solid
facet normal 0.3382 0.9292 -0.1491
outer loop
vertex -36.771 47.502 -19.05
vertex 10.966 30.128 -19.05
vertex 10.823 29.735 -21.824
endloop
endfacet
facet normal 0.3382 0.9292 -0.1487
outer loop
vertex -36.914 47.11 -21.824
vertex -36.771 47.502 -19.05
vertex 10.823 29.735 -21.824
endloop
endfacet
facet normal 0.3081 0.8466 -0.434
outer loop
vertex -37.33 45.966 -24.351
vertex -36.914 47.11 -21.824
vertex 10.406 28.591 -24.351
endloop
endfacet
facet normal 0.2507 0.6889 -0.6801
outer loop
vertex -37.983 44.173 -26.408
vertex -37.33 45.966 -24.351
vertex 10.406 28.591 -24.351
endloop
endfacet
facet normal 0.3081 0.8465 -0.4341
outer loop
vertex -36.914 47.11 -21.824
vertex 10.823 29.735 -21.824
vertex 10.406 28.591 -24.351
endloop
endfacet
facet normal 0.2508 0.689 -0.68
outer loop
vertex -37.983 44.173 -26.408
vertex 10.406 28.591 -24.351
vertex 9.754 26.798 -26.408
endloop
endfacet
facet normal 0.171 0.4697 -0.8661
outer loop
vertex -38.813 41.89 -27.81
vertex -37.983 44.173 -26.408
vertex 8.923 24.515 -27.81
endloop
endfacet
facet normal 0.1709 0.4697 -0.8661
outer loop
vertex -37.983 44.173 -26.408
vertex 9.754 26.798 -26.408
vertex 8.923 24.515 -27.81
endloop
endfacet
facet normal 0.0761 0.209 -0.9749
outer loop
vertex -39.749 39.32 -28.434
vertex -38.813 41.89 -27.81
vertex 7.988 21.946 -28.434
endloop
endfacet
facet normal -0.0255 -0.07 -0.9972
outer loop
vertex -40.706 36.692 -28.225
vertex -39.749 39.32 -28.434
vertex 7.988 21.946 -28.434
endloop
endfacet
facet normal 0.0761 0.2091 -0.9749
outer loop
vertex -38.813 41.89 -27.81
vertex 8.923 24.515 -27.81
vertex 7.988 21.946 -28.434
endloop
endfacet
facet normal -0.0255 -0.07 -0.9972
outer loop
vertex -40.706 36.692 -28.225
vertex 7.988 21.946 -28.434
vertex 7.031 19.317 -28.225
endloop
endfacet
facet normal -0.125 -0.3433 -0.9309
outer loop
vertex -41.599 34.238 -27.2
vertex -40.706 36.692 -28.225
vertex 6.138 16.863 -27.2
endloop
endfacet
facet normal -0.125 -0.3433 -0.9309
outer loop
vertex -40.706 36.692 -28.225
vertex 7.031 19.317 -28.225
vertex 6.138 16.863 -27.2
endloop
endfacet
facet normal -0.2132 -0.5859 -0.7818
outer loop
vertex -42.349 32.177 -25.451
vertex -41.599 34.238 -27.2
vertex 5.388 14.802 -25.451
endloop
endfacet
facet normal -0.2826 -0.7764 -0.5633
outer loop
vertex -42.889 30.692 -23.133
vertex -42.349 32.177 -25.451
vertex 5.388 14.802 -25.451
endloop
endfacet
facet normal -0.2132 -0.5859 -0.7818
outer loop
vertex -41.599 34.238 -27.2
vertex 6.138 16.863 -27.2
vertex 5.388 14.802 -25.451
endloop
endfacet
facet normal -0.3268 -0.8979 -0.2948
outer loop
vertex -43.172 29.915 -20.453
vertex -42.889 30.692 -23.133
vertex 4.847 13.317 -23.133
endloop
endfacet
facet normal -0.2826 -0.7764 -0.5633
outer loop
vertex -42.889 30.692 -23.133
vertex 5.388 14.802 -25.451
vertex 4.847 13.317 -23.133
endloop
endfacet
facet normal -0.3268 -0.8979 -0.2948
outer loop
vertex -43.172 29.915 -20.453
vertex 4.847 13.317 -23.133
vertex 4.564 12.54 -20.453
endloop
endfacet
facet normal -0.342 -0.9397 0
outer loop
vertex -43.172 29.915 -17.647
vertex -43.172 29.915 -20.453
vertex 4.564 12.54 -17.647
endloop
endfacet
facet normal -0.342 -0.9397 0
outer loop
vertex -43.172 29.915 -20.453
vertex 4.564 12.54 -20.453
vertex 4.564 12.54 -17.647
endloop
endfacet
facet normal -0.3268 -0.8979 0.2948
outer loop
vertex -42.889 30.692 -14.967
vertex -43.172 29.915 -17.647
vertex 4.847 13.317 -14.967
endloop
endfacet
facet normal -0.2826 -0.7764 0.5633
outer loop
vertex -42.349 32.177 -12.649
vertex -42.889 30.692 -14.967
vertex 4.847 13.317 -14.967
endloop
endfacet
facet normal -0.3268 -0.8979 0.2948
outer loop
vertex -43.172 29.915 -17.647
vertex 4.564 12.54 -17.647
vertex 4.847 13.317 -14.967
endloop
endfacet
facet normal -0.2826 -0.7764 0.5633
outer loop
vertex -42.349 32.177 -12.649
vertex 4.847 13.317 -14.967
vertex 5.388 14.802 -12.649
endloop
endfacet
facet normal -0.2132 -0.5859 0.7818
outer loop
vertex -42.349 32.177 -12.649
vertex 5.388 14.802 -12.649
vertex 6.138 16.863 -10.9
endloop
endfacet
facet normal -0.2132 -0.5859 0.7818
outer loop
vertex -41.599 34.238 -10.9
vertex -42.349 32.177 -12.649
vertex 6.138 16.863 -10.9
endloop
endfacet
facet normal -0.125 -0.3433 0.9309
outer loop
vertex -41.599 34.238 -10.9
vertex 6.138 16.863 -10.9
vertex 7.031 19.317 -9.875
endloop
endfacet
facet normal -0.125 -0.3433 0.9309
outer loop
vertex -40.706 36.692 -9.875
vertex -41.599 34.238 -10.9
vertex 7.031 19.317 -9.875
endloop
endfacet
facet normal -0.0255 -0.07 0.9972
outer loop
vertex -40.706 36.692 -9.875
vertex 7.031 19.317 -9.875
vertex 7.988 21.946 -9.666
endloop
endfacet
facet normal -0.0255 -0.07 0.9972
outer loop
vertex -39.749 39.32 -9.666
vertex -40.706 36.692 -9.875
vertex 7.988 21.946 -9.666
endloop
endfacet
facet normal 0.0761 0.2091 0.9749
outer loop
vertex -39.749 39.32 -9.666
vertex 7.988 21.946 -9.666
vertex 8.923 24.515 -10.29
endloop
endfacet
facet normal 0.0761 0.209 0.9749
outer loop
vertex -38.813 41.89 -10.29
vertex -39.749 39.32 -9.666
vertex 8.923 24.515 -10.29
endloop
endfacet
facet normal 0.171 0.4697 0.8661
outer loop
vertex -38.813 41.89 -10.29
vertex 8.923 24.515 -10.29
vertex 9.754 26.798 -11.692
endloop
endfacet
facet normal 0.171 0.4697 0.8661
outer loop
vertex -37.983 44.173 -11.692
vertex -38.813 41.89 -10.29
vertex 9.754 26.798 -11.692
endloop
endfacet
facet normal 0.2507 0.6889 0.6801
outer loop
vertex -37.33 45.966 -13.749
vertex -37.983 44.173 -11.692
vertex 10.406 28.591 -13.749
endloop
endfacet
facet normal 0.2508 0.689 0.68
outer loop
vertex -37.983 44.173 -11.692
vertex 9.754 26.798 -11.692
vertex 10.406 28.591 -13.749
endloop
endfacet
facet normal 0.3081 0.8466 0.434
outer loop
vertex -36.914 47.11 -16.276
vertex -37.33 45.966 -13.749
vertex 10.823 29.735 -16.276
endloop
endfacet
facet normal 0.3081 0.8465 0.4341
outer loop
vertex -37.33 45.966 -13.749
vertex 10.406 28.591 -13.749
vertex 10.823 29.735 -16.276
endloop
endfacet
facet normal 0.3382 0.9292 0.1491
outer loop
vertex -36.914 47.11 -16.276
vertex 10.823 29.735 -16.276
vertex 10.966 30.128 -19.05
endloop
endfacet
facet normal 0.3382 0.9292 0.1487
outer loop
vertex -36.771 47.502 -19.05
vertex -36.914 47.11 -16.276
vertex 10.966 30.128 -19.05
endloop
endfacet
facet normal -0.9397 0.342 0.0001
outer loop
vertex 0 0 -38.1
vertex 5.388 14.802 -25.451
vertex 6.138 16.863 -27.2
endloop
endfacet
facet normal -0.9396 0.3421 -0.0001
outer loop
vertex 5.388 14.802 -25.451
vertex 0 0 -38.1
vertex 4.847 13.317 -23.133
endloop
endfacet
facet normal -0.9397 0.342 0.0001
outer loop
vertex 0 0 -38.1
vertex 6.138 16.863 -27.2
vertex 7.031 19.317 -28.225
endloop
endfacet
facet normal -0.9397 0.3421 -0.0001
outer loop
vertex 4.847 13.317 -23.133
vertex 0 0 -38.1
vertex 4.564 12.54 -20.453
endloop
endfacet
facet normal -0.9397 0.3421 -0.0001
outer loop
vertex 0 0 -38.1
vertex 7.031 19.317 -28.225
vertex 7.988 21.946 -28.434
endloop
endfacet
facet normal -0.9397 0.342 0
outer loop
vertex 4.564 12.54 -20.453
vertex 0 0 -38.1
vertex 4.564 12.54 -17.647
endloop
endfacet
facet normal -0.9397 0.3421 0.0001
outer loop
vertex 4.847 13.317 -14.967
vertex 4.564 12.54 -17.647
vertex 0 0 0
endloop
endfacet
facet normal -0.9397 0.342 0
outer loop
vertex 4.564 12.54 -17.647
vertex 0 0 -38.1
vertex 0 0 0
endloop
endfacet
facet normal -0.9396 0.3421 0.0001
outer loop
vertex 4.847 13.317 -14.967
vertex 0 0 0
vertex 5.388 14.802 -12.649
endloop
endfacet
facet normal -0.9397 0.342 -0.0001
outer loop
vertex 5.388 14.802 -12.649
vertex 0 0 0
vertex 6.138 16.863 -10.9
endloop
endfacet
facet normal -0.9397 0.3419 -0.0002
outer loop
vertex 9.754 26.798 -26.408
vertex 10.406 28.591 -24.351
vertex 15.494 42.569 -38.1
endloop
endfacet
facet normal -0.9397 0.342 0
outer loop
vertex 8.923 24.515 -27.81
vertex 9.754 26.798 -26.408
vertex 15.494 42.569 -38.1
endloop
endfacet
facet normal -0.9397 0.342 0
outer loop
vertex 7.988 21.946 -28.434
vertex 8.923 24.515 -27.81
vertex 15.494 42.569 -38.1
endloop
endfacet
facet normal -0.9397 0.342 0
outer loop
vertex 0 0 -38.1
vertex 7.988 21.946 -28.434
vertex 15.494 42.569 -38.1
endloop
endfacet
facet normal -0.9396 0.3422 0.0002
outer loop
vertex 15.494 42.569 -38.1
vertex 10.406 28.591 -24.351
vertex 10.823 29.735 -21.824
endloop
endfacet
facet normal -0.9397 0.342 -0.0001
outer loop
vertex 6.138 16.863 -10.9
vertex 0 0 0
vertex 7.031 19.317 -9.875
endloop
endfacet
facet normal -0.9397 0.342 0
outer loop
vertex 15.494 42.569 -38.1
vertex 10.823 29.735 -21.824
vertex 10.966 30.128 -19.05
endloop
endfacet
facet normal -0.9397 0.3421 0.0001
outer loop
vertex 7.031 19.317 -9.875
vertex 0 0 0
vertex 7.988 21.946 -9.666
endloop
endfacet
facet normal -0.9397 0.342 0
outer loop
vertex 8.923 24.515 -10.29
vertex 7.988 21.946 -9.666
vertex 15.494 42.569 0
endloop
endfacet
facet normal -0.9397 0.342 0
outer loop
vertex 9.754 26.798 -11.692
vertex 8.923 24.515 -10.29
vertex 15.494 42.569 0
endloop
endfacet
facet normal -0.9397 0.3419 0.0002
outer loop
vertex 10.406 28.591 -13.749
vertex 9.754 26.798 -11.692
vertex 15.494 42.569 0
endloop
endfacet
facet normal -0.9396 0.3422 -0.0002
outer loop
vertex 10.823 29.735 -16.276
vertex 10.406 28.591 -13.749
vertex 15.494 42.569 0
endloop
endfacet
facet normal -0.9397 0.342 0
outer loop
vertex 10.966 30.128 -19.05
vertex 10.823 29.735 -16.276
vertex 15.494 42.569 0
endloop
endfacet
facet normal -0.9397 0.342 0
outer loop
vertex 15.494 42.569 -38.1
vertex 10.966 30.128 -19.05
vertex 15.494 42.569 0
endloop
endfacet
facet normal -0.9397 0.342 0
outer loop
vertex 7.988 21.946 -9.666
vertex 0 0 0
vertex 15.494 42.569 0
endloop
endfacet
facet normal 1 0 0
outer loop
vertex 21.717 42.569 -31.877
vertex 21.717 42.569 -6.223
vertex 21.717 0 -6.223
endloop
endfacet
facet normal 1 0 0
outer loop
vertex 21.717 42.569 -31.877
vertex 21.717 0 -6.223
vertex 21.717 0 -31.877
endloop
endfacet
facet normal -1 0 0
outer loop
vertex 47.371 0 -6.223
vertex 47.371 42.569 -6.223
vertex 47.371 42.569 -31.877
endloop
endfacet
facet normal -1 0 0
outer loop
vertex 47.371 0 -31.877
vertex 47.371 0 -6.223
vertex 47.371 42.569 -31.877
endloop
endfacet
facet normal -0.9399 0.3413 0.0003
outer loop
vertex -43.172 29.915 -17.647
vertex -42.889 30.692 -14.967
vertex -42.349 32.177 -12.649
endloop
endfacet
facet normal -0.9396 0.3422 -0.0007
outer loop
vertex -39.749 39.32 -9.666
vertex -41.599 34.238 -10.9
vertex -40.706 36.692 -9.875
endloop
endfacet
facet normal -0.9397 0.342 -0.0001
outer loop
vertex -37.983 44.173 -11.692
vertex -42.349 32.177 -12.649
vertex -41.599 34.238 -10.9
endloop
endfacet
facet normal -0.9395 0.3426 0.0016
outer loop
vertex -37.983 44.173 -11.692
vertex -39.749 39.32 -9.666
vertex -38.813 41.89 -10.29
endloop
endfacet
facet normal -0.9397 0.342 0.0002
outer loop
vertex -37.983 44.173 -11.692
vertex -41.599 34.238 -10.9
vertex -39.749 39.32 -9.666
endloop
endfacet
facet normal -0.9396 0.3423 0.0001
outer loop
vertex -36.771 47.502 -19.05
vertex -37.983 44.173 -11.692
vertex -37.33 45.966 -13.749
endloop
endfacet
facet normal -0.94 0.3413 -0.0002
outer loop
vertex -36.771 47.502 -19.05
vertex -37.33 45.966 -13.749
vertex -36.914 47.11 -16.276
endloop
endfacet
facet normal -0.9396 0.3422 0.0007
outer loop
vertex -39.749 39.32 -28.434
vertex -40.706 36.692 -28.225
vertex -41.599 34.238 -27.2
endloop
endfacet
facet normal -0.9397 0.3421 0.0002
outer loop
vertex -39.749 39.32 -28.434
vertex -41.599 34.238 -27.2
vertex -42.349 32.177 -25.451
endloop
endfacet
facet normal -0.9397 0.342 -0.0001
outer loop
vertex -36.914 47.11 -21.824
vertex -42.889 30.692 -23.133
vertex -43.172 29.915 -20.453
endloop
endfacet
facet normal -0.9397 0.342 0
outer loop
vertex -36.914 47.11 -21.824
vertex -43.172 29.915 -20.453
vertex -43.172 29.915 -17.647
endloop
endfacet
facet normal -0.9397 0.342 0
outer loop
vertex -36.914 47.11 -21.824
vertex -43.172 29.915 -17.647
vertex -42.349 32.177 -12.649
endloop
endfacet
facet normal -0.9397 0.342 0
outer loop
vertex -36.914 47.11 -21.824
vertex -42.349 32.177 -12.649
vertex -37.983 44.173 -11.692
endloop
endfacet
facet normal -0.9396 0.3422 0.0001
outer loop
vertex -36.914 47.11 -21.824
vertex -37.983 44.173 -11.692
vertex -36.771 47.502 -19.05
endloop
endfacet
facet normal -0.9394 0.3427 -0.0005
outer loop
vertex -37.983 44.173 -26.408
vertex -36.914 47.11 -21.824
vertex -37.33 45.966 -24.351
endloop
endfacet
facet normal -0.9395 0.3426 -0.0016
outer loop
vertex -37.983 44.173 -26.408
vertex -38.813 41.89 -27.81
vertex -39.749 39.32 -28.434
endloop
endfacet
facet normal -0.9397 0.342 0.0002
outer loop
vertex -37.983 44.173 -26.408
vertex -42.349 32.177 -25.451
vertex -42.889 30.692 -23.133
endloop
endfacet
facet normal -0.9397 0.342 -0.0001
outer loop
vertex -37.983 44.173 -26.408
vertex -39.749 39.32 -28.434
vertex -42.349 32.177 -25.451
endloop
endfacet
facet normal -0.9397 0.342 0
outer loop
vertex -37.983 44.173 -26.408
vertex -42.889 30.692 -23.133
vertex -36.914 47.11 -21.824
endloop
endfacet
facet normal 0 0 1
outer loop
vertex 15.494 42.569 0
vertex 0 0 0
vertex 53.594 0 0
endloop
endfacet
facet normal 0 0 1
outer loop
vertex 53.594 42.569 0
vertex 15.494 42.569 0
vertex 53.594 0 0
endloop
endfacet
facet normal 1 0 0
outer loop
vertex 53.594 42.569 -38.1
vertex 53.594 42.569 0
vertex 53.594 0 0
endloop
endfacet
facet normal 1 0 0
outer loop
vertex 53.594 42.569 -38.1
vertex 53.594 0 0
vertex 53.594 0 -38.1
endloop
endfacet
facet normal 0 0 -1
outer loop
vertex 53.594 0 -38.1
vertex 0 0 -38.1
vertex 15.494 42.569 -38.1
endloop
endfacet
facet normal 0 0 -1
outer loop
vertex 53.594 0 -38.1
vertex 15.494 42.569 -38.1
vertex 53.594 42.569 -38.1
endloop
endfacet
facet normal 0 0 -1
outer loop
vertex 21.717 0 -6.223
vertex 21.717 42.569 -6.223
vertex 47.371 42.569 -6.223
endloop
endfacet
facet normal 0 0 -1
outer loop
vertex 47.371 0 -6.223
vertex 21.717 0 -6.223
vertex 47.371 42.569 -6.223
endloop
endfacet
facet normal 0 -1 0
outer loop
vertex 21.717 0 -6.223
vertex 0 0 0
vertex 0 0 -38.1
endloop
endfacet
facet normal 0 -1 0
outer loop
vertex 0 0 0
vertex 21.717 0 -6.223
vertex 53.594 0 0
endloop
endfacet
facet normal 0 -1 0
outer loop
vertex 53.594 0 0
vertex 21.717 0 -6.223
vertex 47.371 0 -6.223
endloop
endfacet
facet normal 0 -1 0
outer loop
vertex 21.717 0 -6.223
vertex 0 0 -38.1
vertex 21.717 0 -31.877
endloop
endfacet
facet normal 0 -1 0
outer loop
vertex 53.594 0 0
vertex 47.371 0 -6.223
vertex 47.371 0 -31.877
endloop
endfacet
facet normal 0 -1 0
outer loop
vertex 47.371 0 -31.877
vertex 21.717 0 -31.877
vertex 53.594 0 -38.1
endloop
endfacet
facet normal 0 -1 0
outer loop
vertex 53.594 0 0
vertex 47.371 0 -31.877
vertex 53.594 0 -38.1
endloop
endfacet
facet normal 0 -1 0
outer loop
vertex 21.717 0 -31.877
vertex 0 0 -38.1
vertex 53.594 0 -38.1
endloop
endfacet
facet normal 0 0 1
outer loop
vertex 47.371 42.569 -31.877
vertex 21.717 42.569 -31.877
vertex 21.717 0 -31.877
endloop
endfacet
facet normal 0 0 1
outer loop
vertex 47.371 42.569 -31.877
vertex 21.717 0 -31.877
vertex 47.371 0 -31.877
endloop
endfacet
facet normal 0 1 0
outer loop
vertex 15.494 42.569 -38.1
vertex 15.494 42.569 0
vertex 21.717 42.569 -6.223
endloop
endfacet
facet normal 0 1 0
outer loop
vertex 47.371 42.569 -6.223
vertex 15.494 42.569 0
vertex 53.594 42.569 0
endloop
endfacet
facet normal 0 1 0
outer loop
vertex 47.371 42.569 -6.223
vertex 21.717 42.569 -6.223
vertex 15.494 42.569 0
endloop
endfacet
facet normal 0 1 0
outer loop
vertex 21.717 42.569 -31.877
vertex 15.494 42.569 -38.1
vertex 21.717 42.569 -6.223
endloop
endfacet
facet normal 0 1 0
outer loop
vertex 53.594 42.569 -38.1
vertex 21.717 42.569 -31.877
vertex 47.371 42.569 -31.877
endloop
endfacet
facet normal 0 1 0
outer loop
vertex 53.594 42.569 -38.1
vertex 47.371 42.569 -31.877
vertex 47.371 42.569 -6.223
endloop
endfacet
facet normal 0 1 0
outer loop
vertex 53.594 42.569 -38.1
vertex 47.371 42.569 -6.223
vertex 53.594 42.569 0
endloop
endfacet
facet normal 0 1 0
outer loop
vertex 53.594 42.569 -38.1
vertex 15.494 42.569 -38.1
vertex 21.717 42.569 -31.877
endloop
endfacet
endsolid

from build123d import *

# Parameters (mm, degrees)
SKETCH1_W           = 53.594
SKETCH1_H           = 38.1
BOSS_EXTRUDE1_DEPTH = 42.5694094
CUT_EXTRUDE1_DEPTH  = 79.333144024
SKETCH5_W           = 25.654
SKETCH5_H           = 25.654
CUT_EXTRUDE2_DEPTH  = 79.333144024
SKETCH6_R           = 9.4107
BOSS_EXTRUDE2_DEPTH = 50.8


with BuildPart() as part:
    # Sketch1 → Boss-Extrude1 (new body)
    with BuildSketch(Plane(origin=(0, 0, 0), x_dir=(1, 0, 0), z_dir=(0, 1, 0))):
        with Locations((26.797, 19.05)):
            Rectangle(SKETCH1_W, SKETCH1_H)
    extrude(amount=BOSS_EXTRUDE1_DEPTH)

    # Sketch4 → Cut-Extrude1 (cut, through all)
    with BuildSketch(Plane.XY):
        Polygon((0, -5.737e-06), (15.494, 42.5694094), (0, 42.5694094), align=None)
    extrude(amount=-CUT_EXTRUDE1_DEPTH, mode=Mode.SUBTRACT)

    # Sketch5 → Cut-Extrude2 (cut, through all)
    with BuildSketch(Plane(origin=(0, 42.5694094, 0), x_dir=(1, 0, 0), z_dir=(0, 1, 0))):
        with Locations((34.544, 19.05)):
            Rectangle(SKETCH5_W, SKETCH5_H)
    extrude(amount=-CUT_EXTRUDE2_DEPTH, mode=Mode.SUBTRACT)


with BuildPart() as boss_extrude2_tool:
    # Sketch6 → Boss-Extrude2 (new body)
    with BuildSketch(Plane(origin=(0, 0, 0), x_dir=(0, 0, 1), z_dir=(-0.9396926207859096, 0.3420201433256656, 0))):
        with Locations(Location((-19.05, 22.650709993, 0), (0, 0, 90))):
            Circle(SKETCH6_R)
    extrude(amount=BOSS_EXTRUDE2_DEPTH)


with BuildPart() as part_1:
    add(part.part)


with BuildPart() as part_2:
    # Boss-Extrude2: joined with boss_extrude2_tool
    add(part_1.part.fuse(boss_extrude2_tool.part, tol=0.00001))


solid = part_2.part
